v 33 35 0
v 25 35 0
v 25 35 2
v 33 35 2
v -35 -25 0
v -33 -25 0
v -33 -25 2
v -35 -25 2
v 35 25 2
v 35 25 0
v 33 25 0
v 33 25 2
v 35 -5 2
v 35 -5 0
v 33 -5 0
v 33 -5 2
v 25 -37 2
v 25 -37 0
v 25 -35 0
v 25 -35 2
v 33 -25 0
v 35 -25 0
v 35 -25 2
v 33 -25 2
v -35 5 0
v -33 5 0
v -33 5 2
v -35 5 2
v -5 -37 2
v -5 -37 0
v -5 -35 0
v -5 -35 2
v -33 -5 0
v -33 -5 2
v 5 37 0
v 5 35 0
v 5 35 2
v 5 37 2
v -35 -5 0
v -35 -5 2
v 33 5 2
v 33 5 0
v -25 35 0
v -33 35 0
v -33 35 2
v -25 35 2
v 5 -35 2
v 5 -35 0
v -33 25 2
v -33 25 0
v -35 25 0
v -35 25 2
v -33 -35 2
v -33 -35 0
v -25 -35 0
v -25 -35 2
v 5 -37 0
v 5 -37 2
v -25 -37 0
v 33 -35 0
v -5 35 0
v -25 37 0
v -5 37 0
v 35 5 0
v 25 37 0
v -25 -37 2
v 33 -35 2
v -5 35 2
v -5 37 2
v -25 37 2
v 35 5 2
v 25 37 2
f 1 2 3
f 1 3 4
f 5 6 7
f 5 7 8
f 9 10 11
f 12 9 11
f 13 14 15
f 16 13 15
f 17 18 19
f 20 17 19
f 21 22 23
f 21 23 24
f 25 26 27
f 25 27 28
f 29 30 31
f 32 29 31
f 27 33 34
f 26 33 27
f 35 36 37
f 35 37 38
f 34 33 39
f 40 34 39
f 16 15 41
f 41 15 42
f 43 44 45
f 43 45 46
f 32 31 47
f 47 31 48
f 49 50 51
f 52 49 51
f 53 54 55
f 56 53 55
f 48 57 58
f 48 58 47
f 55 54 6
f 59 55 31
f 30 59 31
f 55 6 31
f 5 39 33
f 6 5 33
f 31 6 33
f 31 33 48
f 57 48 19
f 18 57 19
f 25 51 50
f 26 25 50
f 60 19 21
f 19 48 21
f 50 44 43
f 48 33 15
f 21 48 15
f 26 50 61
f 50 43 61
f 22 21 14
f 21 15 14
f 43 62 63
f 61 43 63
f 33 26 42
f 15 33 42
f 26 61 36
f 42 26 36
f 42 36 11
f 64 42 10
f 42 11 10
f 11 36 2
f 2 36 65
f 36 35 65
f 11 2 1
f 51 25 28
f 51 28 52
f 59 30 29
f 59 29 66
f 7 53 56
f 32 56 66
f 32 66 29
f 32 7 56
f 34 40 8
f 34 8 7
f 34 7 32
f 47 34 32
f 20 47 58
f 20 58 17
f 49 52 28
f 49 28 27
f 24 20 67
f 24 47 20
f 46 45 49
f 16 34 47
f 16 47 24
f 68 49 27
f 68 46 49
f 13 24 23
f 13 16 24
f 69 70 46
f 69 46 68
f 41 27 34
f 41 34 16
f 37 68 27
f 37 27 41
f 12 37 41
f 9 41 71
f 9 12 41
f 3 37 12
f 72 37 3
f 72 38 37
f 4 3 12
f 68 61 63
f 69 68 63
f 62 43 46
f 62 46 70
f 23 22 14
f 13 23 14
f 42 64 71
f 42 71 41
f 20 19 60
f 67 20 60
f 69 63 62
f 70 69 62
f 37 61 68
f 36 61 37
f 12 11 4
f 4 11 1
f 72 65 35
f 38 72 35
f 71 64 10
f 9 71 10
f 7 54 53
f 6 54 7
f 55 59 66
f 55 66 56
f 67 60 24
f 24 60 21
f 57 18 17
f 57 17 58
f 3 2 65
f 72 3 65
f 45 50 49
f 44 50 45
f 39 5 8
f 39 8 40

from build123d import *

# Parameters (mm, degrees)
SKETCH1_W           = 66
SKETCH1_H           = 70
BOSS_EXTRUDE1_DEPTH = 2
SKETCH2_W           = 2
SKETCH2_H           = 20
BOSS_EXTRUDE2_DEPTH = 2
SKETCH3_W           = 20
SKETCH3_H           = 2
BOSS_EXTRUDE3_DEPTH = 2


with BuildPart() as part:
    # Sketch1 → Boss-Extrude1 (new body)
    with BuildSketch(Plane.XY):
        Rectangle(SKETCH1_W, SKETCH1_H)
    extrude(amount=BOSS_EXTRUDE1_DEPTH)

    # Sketch2 → Boss-Extrude2 (add)
    with BuildSketch(Plane(origin=(0, 0, 0), x_dir=(-1, 0, 0), z_dir=(0, 0, -1))):
        with Locations((34, -15)):
            Rectangle(SKETCH2_W, SKETCH2_H)
        with Locations((34, 15)):
            Rectangle(SKETCH2_W, SKETCH2_H)
        with Locations((-34, -15)):
            Rectangle(SKETCH2_W, SKETCH2_H)
        with Locations((-34, 15)):
            Rectangle(SKETCH2_W, SKETCH2_H)
    extrude(amount=-BOSS_EXTRUDE2_DEPTH)

    # Sketch3 → Boss-Extrude3 (add)
    with BuildSketch(Plane(origin=(0, 0, 0), x_dir=(-1, 0, 0), z_dir=(0, 0, -1))):
        with Locations((-15, 36)):
            Rectangle(SKETCH3_W, SKETCH3_H)
        with Locations((15, 36)):
            Rectangle(SKETCH3_W, SKETCH3_H)
        with Locations((-15, -36)):
            Rectangle(SKETCH3_W, SKETCH3_H)
        with Locations((15, -36)):
            Rectangle(SKETCH3_W, SKETCH3_H)
    extrude(amount=-BOSS_EXTRUDE3_DEPTH)


solid = part.part
